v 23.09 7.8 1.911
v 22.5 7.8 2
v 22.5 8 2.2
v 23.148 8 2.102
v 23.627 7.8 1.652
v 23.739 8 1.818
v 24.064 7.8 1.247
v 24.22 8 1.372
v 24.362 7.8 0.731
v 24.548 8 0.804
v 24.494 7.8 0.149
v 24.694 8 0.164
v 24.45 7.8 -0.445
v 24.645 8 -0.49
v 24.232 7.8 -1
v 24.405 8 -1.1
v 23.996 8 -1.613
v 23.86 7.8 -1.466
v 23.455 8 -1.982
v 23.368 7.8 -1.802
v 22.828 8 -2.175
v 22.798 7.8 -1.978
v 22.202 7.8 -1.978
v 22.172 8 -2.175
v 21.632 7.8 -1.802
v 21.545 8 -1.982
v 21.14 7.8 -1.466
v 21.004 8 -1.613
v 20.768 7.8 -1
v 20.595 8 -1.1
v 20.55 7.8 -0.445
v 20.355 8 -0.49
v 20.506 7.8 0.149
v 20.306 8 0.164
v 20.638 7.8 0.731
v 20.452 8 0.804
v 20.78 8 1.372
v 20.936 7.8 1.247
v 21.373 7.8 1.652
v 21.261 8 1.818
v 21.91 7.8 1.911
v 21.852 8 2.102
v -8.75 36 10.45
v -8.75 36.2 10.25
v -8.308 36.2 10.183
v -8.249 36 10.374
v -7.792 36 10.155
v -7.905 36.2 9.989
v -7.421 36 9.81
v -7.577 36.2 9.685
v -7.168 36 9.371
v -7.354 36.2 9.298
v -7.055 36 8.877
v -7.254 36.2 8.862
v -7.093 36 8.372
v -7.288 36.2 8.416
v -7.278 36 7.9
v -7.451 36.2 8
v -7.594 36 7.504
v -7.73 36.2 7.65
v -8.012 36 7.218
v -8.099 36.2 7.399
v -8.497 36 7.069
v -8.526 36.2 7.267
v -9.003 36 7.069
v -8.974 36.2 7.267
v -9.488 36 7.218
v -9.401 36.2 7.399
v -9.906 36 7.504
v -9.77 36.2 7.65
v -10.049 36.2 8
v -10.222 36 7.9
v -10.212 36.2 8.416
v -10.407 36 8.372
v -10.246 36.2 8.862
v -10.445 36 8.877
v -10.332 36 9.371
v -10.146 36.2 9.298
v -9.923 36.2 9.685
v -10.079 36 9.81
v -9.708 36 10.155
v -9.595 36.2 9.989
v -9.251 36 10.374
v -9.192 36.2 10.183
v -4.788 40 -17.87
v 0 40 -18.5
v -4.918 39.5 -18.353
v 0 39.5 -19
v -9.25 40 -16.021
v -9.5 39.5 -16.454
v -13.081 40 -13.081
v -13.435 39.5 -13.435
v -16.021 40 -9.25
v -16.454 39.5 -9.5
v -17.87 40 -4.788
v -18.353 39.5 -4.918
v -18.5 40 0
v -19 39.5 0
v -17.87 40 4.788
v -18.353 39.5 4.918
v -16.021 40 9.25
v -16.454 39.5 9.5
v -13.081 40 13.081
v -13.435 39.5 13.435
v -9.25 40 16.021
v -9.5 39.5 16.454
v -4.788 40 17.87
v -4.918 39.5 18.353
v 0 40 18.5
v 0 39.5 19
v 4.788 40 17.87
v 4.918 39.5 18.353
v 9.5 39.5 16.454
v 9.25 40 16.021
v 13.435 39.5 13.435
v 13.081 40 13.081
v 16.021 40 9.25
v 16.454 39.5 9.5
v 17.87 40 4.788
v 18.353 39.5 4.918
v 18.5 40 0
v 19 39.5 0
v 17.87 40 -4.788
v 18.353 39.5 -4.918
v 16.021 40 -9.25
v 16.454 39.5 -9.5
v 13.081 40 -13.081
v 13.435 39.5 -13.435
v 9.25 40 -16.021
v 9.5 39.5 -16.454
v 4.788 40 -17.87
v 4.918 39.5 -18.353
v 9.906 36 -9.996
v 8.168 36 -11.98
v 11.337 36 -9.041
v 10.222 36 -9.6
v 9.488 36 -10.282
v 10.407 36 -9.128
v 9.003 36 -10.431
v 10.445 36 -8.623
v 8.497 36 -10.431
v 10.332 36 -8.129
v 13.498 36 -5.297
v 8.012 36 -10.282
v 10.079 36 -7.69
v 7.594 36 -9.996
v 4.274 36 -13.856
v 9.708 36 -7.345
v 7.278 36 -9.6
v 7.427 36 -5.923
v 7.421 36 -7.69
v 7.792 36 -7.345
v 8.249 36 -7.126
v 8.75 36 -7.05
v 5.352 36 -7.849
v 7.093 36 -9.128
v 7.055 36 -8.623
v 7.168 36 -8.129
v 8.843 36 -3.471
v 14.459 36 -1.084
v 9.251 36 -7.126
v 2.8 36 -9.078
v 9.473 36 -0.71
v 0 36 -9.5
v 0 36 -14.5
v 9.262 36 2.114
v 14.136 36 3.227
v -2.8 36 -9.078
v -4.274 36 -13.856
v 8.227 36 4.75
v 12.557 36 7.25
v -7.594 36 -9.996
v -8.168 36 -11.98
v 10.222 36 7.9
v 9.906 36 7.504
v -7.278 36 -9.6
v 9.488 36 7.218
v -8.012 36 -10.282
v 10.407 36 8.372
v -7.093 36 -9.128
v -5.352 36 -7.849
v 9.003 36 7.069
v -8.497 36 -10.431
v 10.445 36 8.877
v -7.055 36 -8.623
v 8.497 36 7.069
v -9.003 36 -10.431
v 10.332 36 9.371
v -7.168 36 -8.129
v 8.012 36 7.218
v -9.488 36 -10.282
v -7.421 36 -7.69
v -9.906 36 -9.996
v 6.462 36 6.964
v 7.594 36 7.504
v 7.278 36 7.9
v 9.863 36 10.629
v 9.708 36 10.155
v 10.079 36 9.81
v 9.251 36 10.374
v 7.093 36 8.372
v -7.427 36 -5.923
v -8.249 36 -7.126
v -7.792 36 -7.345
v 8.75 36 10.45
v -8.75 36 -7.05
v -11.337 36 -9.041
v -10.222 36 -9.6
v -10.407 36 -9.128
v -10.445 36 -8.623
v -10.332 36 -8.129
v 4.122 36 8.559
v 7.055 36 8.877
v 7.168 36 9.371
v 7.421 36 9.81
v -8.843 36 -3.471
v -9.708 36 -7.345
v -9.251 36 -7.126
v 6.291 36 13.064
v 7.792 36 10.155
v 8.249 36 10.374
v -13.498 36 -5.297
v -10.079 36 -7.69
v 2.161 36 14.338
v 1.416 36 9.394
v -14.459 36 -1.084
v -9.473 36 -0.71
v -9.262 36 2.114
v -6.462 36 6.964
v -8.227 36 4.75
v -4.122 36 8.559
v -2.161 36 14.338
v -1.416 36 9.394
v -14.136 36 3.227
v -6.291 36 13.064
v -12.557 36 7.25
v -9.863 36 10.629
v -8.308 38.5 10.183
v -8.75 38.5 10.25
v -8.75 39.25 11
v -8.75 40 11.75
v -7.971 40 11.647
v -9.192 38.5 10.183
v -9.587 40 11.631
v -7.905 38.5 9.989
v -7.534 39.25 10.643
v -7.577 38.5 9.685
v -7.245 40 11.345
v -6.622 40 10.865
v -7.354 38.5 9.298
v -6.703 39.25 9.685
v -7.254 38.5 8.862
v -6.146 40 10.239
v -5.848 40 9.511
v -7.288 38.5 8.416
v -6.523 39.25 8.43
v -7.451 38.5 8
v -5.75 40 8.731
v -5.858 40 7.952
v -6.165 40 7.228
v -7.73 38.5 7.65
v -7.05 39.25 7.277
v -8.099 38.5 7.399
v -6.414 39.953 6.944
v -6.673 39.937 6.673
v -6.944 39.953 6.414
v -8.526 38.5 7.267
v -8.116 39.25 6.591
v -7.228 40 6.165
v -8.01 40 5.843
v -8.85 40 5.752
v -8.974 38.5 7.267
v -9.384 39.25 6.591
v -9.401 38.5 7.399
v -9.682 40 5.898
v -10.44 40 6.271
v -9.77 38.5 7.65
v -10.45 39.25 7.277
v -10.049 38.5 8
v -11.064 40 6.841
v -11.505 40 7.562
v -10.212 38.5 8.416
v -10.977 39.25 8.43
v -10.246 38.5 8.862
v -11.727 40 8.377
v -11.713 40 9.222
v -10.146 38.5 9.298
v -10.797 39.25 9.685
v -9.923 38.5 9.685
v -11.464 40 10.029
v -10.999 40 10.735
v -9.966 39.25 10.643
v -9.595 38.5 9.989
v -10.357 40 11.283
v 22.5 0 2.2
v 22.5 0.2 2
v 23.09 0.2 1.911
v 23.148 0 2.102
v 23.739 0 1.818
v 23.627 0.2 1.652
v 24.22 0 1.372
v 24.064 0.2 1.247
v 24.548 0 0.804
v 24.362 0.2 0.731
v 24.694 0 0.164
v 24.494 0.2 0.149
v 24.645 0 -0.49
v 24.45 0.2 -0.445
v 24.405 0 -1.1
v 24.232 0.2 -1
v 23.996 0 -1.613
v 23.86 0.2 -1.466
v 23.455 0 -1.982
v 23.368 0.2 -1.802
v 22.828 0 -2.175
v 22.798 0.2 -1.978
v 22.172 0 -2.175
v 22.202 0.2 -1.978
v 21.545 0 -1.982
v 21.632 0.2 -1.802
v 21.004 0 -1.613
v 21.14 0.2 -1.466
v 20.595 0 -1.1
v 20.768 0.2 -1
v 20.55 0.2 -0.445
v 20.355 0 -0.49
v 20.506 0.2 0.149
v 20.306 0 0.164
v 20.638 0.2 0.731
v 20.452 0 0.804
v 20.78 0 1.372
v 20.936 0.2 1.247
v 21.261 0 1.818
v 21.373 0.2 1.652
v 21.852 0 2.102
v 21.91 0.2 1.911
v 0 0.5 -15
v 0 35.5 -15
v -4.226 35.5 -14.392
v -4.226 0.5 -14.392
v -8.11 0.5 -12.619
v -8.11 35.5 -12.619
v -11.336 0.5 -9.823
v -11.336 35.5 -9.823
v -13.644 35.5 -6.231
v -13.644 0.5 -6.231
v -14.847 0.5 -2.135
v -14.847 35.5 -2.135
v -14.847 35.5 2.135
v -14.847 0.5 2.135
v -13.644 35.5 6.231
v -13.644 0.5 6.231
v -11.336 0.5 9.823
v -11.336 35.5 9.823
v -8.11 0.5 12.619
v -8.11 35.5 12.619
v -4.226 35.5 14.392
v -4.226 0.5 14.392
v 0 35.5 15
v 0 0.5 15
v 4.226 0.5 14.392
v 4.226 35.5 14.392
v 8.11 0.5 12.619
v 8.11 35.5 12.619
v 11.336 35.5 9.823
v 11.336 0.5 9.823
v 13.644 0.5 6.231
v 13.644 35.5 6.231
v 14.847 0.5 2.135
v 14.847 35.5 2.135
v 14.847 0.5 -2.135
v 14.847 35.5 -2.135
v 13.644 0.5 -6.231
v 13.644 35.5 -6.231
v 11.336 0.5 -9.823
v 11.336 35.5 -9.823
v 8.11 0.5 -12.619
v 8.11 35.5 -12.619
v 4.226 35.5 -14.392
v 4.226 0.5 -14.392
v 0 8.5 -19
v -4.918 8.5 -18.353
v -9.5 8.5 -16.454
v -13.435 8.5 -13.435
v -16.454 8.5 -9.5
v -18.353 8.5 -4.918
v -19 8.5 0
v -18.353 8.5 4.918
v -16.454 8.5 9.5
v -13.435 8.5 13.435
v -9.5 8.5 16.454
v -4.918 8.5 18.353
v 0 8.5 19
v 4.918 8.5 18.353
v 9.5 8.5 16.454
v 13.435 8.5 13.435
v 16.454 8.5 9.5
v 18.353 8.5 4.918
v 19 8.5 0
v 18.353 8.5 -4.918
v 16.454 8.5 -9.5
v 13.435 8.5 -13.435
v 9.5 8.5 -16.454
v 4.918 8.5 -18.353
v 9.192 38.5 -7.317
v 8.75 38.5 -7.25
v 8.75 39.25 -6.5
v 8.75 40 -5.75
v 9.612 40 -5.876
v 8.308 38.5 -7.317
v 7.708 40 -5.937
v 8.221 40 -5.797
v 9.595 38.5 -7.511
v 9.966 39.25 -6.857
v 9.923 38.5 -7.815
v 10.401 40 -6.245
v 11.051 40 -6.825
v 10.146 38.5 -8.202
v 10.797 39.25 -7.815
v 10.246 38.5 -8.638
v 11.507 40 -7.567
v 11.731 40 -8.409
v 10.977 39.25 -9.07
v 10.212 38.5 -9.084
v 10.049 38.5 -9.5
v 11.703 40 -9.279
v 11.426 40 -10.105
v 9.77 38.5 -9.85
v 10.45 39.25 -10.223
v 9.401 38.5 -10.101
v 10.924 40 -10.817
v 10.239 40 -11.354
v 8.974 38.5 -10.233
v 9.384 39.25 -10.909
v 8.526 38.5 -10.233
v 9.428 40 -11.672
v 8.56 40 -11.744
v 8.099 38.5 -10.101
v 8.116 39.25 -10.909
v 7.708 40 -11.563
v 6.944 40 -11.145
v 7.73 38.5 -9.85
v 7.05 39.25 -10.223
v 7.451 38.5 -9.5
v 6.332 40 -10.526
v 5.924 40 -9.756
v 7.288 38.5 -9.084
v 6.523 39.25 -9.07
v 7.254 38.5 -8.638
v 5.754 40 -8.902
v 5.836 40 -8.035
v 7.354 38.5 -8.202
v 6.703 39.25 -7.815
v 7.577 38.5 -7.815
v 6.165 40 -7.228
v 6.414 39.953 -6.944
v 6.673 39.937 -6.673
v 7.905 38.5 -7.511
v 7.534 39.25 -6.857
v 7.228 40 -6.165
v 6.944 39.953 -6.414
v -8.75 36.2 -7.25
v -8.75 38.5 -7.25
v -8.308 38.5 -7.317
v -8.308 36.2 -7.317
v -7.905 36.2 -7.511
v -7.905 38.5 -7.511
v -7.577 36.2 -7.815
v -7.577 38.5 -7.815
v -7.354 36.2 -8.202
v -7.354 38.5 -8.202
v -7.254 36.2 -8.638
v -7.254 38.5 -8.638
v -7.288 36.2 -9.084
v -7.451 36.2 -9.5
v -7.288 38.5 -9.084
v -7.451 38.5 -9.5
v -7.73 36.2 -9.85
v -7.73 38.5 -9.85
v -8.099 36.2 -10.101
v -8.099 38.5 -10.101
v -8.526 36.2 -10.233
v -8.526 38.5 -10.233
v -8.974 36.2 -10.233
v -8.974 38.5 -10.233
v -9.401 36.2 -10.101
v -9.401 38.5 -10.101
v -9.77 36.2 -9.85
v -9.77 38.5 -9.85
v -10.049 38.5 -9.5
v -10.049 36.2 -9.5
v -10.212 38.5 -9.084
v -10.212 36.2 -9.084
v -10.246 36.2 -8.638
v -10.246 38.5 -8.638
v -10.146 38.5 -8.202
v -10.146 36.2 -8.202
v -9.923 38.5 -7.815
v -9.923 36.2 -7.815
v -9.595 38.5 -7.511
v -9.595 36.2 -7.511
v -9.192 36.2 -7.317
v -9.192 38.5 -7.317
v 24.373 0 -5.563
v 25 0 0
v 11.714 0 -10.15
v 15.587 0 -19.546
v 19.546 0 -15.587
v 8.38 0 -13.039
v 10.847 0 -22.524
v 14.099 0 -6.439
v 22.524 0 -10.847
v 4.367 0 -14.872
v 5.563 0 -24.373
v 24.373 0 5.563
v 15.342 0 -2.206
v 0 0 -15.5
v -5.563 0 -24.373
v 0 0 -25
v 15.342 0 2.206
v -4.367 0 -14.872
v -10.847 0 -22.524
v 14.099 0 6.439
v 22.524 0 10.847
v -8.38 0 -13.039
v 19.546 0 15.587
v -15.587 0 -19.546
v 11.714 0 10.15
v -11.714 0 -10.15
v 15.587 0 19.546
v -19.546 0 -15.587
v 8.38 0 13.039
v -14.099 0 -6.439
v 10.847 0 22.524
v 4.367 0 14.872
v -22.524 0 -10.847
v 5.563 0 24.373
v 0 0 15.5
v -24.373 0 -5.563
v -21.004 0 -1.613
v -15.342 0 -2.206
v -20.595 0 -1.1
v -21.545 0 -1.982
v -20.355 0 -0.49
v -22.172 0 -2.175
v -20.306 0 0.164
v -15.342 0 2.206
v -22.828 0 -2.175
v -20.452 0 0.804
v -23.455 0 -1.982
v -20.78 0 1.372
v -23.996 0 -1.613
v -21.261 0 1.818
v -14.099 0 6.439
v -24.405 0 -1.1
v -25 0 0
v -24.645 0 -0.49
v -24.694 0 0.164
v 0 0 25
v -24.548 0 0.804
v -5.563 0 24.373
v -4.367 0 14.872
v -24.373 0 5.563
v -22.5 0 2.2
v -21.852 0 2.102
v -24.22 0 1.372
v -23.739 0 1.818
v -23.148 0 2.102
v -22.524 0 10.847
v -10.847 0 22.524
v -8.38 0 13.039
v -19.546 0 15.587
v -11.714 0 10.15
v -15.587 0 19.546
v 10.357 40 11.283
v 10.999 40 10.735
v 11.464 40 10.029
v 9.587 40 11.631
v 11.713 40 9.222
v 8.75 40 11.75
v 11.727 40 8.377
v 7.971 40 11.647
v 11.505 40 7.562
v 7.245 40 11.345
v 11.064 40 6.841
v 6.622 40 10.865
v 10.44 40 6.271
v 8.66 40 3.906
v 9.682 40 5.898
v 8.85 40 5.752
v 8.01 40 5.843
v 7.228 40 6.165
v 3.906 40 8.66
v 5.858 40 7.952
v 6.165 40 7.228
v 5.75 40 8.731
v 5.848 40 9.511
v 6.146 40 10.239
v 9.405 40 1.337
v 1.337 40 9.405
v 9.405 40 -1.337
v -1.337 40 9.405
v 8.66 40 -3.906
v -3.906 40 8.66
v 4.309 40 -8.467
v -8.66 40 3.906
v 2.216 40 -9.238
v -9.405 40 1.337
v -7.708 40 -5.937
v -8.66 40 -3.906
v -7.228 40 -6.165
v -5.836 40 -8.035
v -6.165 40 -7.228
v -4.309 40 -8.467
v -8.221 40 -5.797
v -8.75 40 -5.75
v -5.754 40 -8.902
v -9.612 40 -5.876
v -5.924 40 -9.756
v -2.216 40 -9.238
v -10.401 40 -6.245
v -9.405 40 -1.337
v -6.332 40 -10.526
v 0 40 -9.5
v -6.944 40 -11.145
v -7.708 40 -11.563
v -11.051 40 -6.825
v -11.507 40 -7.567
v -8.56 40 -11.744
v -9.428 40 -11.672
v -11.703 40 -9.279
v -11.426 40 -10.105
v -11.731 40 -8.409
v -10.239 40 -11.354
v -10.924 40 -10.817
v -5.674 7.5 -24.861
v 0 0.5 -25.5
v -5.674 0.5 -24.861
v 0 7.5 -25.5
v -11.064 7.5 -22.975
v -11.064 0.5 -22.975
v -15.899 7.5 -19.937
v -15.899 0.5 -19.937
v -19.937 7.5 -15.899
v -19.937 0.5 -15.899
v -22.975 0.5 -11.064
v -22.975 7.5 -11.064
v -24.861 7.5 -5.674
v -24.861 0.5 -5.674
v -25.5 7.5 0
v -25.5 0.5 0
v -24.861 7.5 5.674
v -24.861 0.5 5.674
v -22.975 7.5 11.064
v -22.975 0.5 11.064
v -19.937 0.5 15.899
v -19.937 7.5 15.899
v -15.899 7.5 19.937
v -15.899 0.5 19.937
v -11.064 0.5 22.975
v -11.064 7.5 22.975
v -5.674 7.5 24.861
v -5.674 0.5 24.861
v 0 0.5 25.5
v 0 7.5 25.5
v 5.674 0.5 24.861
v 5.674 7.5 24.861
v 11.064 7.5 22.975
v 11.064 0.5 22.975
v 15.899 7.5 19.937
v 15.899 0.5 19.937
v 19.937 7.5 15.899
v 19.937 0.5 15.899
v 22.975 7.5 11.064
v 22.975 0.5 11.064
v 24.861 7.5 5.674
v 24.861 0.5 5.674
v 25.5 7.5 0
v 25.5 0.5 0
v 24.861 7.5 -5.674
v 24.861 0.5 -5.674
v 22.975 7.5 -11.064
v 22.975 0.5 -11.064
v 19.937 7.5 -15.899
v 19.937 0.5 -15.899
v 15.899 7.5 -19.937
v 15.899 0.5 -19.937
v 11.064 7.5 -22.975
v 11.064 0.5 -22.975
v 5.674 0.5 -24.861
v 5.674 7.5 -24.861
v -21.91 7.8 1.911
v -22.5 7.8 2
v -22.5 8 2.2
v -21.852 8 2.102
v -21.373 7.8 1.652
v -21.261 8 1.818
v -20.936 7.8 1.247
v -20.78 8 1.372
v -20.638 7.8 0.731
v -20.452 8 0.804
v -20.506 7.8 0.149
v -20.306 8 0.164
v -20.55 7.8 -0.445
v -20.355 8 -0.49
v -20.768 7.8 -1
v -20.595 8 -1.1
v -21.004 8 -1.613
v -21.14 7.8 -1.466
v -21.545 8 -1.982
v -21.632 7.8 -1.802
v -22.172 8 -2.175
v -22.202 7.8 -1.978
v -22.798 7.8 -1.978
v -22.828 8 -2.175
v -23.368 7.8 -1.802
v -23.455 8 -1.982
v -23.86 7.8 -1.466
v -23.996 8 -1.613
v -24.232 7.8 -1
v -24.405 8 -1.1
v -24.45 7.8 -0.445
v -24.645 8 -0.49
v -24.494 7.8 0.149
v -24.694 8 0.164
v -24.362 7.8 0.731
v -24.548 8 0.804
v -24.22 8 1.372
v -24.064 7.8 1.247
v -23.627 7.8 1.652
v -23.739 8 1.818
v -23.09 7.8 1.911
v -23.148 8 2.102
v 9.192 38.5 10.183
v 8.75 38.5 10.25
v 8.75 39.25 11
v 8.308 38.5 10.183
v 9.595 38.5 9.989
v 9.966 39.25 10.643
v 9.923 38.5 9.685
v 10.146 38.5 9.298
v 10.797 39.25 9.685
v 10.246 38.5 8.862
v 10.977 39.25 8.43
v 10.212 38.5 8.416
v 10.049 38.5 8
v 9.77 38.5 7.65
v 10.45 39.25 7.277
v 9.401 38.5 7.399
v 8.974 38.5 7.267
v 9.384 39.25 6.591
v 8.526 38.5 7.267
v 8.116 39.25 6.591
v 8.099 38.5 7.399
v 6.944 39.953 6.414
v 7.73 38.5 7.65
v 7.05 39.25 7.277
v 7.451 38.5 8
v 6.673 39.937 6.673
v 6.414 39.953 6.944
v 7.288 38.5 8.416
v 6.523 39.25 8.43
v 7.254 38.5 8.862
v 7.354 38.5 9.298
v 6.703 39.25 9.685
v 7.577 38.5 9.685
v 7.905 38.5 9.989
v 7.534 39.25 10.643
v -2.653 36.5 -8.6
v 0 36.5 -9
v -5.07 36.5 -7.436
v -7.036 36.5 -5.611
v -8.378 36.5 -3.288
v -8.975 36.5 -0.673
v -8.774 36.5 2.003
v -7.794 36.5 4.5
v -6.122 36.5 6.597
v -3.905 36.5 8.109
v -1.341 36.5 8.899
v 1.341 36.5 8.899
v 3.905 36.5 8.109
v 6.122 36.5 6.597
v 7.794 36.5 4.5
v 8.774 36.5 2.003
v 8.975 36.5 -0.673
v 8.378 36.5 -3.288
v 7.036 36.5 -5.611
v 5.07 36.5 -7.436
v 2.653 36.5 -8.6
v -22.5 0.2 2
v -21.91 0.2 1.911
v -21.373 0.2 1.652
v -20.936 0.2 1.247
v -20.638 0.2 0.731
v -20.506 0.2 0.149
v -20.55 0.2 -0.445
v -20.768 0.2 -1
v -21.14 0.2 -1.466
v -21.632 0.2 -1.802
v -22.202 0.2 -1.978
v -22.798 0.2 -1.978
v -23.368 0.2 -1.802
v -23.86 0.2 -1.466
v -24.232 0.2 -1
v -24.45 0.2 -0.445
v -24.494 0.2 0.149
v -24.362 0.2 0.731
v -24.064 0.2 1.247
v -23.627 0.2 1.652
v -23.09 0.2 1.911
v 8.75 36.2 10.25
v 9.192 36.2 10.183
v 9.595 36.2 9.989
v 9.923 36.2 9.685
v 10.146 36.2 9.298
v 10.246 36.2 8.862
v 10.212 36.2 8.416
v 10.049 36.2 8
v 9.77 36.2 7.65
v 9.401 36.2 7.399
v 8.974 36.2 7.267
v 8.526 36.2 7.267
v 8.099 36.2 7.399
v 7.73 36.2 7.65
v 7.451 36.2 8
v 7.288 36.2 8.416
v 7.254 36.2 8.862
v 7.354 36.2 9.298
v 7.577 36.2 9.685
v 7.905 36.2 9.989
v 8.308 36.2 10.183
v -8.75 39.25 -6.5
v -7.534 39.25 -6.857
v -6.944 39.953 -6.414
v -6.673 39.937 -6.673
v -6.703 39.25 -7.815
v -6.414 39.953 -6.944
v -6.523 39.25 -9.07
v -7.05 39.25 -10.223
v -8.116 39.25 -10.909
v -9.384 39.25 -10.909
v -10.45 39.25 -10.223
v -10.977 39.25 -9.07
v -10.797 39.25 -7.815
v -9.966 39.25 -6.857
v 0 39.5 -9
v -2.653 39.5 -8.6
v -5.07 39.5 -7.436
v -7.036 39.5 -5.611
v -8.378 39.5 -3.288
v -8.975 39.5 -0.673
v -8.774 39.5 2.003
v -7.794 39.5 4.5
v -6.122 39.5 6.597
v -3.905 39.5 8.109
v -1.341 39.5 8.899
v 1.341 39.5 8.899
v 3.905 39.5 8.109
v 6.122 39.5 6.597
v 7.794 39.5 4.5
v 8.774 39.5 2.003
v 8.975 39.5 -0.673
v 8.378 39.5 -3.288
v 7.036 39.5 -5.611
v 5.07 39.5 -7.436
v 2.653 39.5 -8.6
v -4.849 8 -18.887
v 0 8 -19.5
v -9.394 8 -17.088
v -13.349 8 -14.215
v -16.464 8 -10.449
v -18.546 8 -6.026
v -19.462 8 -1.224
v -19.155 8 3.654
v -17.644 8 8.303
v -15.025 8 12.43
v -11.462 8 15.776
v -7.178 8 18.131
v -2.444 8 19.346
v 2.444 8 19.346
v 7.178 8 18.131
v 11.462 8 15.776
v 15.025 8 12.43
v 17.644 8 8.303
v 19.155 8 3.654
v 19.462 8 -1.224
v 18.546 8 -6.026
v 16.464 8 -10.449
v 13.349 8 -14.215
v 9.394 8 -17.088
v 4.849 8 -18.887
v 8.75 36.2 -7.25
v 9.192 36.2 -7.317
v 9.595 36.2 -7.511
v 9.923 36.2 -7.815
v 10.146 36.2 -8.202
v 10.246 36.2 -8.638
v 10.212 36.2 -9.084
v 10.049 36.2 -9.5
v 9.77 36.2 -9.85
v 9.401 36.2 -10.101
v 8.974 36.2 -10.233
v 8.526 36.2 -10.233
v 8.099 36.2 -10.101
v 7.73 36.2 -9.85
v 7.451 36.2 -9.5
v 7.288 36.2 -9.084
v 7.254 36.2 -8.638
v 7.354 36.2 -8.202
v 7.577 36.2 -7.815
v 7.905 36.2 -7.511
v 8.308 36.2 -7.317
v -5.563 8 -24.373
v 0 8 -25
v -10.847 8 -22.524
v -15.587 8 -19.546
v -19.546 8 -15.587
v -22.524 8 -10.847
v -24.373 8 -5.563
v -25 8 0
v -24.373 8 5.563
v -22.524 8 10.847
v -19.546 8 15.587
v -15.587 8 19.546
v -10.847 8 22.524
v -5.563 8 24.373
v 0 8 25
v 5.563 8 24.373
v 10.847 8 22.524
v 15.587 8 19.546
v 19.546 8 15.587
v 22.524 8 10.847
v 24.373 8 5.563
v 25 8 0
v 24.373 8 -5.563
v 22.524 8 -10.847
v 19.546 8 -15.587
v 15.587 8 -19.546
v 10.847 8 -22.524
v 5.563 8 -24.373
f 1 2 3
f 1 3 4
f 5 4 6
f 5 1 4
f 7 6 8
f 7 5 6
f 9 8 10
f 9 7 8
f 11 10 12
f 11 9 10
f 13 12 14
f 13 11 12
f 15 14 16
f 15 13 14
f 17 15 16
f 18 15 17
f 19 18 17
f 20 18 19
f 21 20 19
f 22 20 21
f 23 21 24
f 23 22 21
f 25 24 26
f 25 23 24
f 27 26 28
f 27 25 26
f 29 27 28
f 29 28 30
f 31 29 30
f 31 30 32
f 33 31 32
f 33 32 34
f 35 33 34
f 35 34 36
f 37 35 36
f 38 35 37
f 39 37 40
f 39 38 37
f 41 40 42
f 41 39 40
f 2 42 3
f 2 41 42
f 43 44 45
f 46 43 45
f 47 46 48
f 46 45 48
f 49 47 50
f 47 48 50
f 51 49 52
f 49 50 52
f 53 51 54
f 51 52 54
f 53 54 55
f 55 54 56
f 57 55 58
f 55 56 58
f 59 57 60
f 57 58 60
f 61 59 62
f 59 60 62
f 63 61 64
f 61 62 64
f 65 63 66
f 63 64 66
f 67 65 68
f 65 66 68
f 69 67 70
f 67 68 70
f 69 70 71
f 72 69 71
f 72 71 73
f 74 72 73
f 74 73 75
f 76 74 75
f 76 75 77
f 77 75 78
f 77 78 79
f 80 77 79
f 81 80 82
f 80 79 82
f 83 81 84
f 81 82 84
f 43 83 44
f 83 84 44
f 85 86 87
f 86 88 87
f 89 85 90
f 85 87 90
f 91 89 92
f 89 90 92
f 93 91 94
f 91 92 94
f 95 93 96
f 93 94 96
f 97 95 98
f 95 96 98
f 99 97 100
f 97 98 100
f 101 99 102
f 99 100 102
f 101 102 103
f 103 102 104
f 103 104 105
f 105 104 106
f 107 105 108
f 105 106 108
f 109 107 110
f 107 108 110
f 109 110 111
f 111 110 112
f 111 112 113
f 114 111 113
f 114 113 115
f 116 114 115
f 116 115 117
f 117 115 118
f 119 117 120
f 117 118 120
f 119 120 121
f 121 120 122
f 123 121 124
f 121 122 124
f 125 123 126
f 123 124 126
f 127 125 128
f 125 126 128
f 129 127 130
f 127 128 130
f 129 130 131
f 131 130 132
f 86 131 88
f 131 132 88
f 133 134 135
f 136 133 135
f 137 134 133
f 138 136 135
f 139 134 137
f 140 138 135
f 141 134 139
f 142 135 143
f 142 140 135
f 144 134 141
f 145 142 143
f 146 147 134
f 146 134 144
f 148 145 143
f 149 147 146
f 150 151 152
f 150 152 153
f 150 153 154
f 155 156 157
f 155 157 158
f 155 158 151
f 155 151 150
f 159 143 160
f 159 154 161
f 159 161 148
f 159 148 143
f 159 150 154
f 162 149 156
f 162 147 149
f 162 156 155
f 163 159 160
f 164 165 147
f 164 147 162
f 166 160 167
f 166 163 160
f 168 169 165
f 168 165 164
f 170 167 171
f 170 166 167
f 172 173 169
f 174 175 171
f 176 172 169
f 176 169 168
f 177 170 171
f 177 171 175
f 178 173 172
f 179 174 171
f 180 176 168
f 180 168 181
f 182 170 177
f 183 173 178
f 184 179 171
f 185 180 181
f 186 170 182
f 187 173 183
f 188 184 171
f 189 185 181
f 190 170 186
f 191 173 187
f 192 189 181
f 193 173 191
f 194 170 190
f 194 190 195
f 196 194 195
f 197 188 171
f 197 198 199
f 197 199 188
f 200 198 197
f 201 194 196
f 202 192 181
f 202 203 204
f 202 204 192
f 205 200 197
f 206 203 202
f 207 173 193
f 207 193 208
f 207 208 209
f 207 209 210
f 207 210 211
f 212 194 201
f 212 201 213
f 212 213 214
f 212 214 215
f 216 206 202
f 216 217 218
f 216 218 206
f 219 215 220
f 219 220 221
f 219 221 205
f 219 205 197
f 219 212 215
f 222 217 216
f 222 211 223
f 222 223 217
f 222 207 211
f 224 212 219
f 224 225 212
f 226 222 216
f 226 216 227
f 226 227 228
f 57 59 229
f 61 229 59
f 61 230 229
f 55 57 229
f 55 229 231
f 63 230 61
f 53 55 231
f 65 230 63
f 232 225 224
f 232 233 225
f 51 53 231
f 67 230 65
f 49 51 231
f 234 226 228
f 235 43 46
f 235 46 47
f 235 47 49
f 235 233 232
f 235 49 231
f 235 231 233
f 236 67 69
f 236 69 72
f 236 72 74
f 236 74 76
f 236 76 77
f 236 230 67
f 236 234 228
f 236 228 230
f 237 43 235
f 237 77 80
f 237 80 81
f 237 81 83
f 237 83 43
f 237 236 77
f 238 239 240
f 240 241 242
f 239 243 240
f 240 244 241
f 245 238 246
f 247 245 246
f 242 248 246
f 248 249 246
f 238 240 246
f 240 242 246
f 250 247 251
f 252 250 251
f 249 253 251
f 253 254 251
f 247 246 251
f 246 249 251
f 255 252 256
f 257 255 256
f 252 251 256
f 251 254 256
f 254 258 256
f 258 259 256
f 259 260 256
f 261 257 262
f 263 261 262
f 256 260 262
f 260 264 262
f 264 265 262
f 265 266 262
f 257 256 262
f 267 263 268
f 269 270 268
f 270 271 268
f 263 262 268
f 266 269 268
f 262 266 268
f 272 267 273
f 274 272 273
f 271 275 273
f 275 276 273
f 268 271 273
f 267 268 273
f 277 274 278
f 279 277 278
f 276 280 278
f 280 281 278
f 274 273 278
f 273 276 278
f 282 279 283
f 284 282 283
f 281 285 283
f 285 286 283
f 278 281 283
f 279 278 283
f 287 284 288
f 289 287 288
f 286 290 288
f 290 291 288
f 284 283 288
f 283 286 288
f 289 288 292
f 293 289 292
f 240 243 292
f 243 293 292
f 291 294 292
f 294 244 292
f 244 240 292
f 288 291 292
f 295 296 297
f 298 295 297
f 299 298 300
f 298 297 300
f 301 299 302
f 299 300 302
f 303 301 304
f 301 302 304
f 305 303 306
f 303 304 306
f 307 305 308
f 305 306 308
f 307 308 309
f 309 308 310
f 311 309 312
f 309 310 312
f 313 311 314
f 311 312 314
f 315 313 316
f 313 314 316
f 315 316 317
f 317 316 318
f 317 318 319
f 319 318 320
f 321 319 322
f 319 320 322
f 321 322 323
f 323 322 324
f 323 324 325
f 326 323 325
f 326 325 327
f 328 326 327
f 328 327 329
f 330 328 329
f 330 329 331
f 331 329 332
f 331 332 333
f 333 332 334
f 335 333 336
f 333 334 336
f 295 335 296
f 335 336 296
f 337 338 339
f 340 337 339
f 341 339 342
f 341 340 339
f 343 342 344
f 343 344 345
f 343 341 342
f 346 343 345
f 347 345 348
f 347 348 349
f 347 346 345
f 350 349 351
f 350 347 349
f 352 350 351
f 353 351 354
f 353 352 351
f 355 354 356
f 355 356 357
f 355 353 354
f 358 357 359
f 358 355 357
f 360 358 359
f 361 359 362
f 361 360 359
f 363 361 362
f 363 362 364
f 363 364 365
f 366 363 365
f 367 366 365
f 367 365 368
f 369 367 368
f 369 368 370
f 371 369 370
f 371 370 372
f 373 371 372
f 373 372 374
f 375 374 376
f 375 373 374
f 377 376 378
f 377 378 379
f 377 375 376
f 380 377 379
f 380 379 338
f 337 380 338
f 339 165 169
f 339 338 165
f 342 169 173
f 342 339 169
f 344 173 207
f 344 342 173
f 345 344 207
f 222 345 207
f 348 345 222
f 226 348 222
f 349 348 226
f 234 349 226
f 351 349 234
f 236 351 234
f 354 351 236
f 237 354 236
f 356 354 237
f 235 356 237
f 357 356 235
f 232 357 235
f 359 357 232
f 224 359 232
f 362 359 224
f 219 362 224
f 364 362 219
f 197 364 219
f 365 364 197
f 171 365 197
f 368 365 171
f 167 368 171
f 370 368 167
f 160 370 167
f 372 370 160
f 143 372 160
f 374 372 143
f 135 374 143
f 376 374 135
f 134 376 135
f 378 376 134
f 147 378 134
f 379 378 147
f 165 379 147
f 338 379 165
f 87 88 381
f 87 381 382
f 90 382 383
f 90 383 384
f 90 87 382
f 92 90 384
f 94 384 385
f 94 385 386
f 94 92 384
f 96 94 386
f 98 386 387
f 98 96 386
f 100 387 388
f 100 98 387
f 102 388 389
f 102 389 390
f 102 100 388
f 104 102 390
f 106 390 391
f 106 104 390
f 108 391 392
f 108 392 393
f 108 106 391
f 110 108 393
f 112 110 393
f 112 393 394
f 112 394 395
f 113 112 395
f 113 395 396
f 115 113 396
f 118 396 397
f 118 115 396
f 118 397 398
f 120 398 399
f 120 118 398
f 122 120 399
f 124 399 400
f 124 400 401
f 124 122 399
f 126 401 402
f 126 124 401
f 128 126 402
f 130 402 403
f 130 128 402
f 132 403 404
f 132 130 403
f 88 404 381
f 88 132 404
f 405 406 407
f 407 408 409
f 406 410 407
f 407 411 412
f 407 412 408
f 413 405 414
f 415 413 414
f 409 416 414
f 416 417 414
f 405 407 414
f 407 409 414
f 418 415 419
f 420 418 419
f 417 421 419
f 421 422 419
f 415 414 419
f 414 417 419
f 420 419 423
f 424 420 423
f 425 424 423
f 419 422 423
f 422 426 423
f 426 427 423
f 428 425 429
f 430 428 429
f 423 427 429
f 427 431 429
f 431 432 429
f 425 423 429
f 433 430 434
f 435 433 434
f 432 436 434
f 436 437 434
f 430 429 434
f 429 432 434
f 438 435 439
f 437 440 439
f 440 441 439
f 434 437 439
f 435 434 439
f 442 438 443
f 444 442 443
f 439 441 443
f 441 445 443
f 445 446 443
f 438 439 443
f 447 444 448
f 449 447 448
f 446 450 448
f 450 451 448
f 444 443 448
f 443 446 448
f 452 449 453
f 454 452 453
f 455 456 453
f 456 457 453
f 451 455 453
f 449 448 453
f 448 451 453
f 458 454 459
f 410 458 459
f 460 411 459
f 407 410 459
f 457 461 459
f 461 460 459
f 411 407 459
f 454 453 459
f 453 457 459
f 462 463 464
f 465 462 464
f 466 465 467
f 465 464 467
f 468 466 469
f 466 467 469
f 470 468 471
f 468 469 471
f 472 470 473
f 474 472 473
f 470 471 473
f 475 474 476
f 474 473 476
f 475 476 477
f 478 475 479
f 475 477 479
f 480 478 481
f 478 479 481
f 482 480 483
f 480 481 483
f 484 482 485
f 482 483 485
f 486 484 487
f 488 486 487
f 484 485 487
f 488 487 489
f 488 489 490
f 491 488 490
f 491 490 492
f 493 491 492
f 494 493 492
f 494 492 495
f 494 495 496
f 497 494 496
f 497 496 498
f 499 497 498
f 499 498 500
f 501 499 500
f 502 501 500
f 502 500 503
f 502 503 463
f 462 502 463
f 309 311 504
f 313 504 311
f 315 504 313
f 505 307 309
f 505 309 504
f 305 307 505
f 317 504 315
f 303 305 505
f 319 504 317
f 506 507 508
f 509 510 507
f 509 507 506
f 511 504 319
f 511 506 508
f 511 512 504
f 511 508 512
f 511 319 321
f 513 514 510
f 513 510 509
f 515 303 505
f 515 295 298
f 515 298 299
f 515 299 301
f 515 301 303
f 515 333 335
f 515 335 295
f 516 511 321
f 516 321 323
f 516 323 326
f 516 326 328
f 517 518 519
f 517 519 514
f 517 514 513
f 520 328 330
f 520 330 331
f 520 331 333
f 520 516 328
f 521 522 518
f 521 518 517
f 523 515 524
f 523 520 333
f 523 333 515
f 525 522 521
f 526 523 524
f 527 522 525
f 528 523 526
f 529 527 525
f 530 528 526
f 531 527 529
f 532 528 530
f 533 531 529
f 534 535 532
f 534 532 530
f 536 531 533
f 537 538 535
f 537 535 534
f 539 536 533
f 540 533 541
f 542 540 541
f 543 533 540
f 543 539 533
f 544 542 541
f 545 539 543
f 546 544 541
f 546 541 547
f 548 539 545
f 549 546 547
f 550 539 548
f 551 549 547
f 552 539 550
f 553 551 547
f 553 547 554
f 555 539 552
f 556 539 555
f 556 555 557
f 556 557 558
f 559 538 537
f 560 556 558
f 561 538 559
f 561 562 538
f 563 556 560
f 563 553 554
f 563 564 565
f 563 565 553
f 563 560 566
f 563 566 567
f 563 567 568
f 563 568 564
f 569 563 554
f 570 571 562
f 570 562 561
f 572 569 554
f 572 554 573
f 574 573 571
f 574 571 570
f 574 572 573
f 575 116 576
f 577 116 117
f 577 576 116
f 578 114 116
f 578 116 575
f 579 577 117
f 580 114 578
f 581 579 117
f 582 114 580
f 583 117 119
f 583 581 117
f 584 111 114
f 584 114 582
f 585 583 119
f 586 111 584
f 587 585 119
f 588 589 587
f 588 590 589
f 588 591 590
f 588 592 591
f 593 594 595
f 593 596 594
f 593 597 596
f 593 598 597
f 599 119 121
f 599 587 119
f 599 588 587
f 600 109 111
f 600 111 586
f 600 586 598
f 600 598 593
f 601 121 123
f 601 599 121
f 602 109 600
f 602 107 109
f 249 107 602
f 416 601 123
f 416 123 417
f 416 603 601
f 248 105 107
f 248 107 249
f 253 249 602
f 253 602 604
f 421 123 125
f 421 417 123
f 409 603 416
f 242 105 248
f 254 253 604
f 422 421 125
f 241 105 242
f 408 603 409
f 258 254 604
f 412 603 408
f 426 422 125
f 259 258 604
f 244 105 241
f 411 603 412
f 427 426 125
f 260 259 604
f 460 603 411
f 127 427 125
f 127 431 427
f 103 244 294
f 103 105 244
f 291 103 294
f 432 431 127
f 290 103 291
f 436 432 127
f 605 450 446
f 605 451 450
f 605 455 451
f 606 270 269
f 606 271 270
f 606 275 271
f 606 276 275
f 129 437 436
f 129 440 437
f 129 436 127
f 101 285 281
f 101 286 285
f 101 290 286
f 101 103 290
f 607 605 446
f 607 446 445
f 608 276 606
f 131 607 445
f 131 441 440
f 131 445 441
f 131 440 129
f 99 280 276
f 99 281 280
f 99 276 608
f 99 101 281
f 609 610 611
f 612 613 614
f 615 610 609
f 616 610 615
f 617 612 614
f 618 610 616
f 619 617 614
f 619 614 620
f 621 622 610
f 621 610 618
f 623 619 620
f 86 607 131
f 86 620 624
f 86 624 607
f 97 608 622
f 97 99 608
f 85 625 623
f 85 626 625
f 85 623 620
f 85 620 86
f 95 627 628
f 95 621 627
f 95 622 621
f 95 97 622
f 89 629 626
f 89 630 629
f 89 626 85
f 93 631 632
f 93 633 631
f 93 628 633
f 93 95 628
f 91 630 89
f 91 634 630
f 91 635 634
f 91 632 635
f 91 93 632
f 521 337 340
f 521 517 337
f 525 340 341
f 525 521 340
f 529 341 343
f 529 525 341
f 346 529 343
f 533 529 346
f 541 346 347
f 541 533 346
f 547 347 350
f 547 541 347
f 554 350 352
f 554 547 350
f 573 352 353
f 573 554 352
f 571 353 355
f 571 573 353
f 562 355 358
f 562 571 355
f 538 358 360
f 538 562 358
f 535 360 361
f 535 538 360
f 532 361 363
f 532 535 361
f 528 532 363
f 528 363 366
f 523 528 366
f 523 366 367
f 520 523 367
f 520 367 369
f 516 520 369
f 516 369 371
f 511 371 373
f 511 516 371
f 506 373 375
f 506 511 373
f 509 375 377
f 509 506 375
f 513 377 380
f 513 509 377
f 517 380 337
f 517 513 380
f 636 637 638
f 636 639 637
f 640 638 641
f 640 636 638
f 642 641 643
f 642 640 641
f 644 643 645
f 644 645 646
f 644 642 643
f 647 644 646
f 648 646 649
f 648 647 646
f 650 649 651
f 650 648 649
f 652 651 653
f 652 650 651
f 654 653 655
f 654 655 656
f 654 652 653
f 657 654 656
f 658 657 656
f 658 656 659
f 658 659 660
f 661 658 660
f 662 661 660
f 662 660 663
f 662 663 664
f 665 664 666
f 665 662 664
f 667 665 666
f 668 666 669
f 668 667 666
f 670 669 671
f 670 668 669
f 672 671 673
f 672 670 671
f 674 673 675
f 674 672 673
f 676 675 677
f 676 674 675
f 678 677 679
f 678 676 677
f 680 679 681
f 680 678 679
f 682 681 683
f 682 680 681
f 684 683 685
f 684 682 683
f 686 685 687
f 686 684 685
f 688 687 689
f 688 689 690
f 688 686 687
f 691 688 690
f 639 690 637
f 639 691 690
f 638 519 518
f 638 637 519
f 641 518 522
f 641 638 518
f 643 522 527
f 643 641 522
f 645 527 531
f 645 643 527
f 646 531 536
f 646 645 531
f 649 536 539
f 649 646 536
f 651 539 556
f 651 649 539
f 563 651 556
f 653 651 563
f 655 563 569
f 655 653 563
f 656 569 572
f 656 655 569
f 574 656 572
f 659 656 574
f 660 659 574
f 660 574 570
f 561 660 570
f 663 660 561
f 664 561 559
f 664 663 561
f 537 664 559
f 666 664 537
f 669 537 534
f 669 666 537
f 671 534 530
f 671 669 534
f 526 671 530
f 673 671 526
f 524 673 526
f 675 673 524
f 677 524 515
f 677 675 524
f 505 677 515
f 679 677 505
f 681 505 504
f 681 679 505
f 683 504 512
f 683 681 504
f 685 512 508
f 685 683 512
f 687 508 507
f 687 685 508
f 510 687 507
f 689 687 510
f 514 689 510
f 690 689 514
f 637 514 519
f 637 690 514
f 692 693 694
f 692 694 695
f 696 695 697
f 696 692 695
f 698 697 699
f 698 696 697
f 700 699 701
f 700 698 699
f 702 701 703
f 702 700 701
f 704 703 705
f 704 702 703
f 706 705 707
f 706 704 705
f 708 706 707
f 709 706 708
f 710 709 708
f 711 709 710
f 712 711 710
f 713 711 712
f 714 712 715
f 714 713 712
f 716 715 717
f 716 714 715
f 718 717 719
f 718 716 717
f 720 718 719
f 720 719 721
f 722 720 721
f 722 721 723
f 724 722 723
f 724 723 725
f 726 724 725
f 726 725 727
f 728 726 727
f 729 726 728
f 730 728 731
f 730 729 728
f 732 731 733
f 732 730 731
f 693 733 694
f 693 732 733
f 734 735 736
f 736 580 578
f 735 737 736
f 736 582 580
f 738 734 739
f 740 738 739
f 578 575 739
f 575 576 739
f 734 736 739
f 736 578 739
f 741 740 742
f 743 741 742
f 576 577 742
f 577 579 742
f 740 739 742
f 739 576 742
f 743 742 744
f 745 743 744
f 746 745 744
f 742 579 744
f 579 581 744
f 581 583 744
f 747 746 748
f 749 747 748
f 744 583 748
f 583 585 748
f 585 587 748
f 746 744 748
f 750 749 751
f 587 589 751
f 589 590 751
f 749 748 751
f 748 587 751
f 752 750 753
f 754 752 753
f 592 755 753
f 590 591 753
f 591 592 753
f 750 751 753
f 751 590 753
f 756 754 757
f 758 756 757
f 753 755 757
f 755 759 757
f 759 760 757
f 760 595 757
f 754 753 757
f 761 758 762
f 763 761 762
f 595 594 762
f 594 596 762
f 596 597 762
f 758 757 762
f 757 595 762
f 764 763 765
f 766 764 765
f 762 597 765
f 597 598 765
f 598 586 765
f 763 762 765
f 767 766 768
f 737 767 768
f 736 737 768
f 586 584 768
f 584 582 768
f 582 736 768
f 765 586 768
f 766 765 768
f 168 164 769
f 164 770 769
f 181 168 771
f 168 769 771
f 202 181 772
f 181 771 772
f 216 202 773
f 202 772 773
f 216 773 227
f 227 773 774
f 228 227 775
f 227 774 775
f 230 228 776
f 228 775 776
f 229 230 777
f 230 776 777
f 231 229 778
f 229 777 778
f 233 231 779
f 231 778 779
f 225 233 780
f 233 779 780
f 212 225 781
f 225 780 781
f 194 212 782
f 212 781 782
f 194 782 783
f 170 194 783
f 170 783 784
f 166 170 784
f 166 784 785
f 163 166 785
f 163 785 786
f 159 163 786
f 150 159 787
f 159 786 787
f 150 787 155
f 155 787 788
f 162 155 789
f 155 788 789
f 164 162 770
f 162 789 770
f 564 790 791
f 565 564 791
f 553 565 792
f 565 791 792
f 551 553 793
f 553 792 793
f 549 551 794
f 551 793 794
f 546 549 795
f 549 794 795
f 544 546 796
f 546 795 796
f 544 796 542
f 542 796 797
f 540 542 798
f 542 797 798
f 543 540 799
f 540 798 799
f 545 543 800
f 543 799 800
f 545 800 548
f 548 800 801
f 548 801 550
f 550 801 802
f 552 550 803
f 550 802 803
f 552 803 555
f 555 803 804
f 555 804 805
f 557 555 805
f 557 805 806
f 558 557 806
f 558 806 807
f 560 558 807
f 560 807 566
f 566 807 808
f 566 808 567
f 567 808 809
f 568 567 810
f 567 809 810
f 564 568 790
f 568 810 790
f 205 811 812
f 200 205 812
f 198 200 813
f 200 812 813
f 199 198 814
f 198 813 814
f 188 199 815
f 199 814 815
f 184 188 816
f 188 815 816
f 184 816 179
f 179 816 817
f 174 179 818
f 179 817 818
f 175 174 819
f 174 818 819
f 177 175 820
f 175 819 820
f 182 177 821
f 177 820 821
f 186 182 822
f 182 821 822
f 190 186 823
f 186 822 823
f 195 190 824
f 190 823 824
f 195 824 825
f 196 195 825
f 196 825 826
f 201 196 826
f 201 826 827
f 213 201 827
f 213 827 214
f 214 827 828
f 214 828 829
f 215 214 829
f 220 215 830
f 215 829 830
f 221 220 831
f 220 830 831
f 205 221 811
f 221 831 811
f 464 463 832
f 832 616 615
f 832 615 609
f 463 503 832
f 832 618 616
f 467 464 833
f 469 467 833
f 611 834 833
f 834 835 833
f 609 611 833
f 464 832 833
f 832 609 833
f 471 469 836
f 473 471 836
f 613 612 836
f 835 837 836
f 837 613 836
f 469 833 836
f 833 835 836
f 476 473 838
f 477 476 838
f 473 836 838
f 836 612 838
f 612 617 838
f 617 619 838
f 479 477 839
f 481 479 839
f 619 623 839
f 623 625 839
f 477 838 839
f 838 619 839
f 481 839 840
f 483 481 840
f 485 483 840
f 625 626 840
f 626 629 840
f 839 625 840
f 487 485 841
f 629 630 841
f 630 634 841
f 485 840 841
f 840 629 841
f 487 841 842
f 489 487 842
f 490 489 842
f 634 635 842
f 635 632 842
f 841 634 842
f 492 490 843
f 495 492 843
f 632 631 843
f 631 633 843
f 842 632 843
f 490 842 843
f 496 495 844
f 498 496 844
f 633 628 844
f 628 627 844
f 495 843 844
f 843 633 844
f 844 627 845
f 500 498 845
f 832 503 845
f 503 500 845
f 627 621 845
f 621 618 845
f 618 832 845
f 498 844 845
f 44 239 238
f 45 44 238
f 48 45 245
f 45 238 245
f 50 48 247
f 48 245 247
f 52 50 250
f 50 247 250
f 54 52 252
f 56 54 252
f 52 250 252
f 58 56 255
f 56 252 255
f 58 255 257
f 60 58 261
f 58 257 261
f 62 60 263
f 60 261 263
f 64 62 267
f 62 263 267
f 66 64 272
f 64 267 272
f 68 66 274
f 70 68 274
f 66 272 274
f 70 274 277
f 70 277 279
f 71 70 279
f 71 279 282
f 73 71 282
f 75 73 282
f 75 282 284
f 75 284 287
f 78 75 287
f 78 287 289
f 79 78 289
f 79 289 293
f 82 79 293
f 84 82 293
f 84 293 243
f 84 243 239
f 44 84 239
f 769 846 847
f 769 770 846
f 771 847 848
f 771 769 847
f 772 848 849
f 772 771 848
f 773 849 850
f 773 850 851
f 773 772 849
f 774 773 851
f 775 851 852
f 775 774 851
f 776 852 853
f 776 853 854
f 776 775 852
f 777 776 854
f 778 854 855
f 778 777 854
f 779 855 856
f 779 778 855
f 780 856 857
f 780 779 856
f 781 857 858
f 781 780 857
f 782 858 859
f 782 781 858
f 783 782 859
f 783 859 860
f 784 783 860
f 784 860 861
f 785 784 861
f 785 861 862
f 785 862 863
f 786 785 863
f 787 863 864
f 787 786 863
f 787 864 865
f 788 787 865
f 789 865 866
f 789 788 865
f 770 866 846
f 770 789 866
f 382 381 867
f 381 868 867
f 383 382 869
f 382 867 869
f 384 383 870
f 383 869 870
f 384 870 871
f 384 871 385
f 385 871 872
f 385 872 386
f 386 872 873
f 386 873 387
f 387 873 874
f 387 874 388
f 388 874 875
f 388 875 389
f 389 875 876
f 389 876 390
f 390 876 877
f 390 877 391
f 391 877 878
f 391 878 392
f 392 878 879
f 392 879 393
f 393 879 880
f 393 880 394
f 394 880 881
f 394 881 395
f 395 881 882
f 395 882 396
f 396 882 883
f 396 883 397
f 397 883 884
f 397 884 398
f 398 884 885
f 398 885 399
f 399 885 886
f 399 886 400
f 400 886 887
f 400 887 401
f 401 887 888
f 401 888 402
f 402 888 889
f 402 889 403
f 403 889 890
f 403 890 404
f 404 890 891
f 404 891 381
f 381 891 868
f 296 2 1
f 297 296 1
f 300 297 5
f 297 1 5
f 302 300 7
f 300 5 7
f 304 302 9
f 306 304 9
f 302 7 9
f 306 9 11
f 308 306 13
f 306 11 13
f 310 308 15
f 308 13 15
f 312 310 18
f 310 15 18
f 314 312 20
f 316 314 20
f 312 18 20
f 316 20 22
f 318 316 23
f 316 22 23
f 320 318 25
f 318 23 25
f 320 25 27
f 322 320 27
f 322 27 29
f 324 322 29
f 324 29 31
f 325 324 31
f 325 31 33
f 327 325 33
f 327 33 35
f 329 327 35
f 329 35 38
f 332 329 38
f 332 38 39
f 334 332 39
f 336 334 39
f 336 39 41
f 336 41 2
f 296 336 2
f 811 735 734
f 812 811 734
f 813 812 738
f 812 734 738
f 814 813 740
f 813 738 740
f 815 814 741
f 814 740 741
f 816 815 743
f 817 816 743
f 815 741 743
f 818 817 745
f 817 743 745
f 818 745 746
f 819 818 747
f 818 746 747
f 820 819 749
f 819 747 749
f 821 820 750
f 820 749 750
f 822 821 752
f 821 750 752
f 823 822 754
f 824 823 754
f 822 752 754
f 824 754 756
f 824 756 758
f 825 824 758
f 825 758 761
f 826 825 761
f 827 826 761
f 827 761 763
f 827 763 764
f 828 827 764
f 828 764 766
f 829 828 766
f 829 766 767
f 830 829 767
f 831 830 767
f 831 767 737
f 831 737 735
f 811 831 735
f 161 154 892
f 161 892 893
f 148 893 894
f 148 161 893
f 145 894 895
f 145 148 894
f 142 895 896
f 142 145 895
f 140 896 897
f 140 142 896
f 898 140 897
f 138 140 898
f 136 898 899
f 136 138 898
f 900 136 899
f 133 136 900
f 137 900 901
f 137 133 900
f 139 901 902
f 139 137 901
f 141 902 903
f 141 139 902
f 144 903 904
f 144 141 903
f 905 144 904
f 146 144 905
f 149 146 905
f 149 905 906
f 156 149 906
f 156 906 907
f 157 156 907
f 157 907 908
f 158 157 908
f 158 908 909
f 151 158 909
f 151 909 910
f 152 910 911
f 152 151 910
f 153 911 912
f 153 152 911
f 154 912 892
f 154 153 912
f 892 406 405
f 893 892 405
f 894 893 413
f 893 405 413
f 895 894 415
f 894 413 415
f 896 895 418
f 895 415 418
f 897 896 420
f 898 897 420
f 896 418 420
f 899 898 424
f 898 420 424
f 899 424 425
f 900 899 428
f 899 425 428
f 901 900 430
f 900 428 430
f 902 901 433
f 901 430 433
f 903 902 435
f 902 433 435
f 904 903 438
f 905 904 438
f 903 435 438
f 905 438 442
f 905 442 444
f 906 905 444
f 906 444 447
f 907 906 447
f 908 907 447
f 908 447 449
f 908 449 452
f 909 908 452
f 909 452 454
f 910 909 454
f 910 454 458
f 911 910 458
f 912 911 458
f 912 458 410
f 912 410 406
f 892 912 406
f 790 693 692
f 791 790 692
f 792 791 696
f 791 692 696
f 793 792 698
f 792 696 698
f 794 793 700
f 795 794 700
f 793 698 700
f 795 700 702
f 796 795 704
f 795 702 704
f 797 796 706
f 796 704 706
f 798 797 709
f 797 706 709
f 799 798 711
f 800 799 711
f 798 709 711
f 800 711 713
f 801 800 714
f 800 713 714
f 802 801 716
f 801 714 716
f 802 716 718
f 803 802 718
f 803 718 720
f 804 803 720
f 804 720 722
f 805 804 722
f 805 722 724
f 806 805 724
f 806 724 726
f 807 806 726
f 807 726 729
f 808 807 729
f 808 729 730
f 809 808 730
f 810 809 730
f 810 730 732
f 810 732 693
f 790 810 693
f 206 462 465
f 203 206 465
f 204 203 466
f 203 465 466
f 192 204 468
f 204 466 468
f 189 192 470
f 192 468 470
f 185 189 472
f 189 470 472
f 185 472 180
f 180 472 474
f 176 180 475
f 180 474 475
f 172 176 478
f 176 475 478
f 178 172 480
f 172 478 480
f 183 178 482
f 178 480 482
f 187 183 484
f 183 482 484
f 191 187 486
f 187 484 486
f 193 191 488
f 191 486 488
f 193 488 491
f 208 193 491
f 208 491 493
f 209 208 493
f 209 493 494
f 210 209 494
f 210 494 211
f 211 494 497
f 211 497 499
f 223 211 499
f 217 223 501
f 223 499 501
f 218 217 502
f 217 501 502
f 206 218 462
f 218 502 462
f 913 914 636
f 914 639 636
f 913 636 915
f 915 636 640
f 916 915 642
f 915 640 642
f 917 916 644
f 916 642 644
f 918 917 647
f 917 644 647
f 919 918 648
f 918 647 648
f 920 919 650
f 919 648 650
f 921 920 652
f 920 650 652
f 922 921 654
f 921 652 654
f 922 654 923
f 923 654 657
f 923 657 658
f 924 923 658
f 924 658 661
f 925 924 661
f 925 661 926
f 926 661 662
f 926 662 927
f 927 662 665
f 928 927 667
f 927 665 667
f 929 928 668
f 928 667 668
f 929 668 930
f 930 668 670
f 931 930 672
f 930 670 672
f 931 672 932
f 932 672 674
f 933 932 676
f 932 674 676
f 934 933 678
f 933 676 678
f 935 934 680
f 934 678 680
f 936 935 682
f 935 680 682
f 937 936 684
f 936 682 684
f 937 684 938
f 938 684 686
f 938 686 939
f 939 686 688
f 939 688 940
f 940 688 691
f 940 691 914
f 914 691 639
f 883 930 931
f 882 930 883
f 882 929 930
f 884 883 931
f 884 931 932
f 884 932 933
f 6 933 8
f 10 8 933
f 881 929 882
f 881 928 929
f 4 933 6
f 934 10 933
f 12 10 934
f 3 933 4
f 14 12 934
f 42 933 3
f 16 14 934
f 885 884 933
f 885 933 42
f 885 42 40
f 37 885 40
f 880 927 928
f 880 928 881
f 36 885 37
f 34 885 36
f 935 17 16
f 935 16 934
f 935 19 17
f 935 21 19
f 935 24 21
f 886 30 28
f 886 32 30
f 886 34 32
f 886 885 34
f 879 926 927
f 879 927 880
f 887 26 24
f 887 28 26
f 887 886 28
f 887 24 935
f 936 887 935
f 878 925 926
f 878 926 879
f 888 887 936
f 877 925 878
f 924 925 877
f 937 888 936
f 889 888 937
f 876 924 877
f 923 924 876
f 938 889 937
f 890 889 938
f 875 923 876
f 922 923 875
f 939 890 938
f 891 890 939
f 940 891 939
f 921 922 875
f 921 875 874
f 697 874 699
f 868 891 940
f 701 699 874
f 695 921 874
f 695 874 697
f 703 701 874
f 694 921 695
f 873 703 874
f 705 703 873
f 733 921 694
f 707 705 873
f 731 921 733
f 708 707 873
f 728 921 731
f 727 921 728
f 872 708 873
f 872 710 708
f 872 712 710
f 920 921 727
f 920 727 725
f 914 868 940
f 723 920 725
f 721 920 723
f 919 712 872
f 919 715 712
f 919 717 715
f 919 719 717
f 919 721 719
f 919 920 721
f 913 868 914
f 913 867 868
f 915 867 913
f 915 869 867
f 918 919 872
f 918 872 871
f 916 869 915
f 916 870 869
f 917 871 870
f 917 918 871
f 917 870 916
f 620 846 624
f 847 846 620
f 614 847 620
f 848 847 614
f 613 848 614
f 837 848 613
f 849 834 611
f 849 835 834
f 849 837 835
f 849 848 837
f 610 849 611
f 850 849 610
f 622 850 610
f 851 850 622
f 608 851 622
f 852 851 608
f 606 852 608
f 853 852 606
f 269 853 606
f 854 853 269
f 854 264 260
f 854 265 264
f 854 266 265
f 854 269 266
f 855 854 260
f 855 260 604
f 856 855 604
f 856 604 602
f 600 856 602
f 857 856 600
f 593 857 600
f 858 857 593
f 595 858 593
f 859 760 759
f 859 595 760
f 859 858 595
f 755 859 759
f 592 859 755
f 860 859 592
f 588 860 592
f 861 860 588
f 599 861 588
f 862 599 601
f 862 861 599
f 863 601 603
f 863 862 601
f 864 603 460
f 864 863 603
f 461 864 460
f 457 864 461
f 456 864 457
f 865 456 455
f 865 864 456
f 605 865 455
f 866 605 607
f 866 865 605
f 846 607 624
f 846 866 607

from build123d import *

# Parameters (mm, degrees)
ESQUISSE2_R             = 1.5
ENL_V_MAT_EXTRU_1_DEPTH = 10
CHANFREIN1_SIZE         = 1.5
ESQUISSE3_R             = 2
ENL_V_MAT_EXTRU_2_DEPTH = 10
CHANFREIN2_SIZE         = 0.2
CHANFREIN3_SIZE         = 0.5


with BuildPart() as part:
    # Esquisse1 → Révolution1 (revolve)
    with BuildSketch(Plane.XY, mode=Mode.PRIVATE) as r_volution1_sk:
        Polygon((-15, 0), (-25.5, 0), (-25.5, 8), (-19, 8), (-19, 40), (-9, 40), (-9, 36), (-15, 36), align=None)
    revolve(r_volution1_sk.sketch.rotate(Axis((0, 0, 0), (0, 1, 0)), 270), axis=Axis((0, 0, 0), (0, 1, 0)))

    # Esquisse2 → Enlèv. mat.-Extru.1 (cut)
    with BuildSketch(Plane(origin=(0, 40, 0), x_dir=(1, 0, 0), z_dir=(0, 1, 0))):
        with Locations(Location((-8.75, 8.75, 0), (0, 0, 270))):
            Circle(ESQUISSE2_R)
        with Locations(Location((8.75, 8.75, 0), (0, 0, 270))):
            Circle(ESQUISSE2_R)
        with Locations(Location((8.75, -8.75, 0), (0, 0, 270))):
            Circle(ESQUISSE2_R)
        with Locations(Location((-8.75, -8.75, 0), (0, 0, 270))):
            Circle(ESQUISSE2_R)
    extrude(amount=-ENL_V_MAT_EXTRU_1_DEPTH, mode=Mode.SUBTRACT)

    # Chanfrein1
    chanfrein1_edges = [part.edges().sort_by_distance(p)[0] for p in [
        (-8.75, 40, -10.25),
        (8.75, 40, -10.25),
        (8.75, 40, 7.25),
        (-8.75, 40, 7.25),
    ]]
    chamfer(chanfrein1_edges, length=CHANFREIN1_SIZE)

    # Esquisse3 → Enlèv. mat.-Extru.2 (cut)
    with BuildSketch(Plane(origin=(0, 8, 0), x_dir=(1, 0, 0), z_dir=(0, 1, 0))):
        with Locations(Location((-22.5, 0, 0), (0, 0, 270))):
            Circle(ESQUISSE3_R)
        with Locations(Location((22.5, 0, 0), (0, 0, 270))):
            Circle(ESQUISSE3_R)
    extrude(amount=-ENL_V_MAT_EXTRU_2_DEPTH, mode=Mode.SUBTRACT)

    # Chanfrein2
    chanfrein2_edges = [part.edges().sort_by_distance(p)[0] for p in [
        (-8.75, 36, -10.25),
        (8.75, 36, -10.25),
        (8.75, 36, 7.25),
        (-8.75, 36, 7.25),
        (-22.5, 0, -2),
        (-22.5, 8, -2),
        (22.5, 0, -2),
        (22.5, 8, -2),
    ]]
    chamfer(chanfrein2_edges, length=CHANFREIN2_SIZE)

    # Chanfrein3
    # the kernel refuses this chamfer: 0.5 mm, written as the material it adds along each edge
    with BuildSketch(Plane(origin=(0, 36, 0), x_dir=(0, 0, -1), z_dir=(1, 0, 0))) as chanfrein3_piece_1:
        Polygon((15 - CHANFREIN3_SIZE, 0), (15, -CHANFREIN3_SIZE), (15, 0), align=None)
    revolve(axis=Axis((0, 36, 0), (0, 1, 0)))
    with BuildSketch(Plane(origin=(0, 8, 0), x_dir=(0, 0, -1), z_dir=(1, 0, 0))) as chanfrein3_piece_2:
        Polygon((19, CHANFREIN3_SIZE), (19 + CHANFREIN3_SIZE, 0), (19, 0), align=None)
    revolve(axis=Axis((0, 8, 0), (0, 1, 0)))
    # the kernel refuses this chamfer: 0.5 mm, written as the material it takes off along each edge
    with BuildSketch(Plane(origin=(0, 36, 0), x_dir=(0, 0, -1), z_dir=(1, 0, 0))) as chanfrein3_2_piece_1:
        Polygon((9 + CHANFREIN3_SIZE, 0), (9, CHANFREIN3_SIZE), (9, 0), align=None)
    revolve(axis=Axis((0, 36, 0), (0, 1, 0)), mode=Mode.SUBTRACT)
    with BuildSketch(Plane(origin=(0, 40, 0), x_dir=(0, 0, -1), z_dir=(1, 0, 0))) as chanfrein3_2_piece_2:
        Polygon((9 + CHANFREIN3_SIZE, 0), (9, -CHANFREIN3_SIZE), (9, 0), align=None)
    revolve(axis=Axis((0, 40, 0), (0, 1, 0)), mode=Mode.SUBTRACT)
    with BuildSketch(Plane(origin=(0, 40, 0), x_dir=(0, 0, -1), z_dir=(1, 0, 0))) as chanfrein3_2_piece_3:
        Polygon((19 - CHANFREIN3_SIZE, 0), (19, -CHANFREIN3_SIZE), (19, 0), align=None)
    revolve(axis=Axis((0, 40, 0), (0, 1, 0)), mode=Mode.SUBTRACT)
    with BuildSketch(Plane(origin=(0, 8, 0), x_dir=(0, 0, -1), z_dir=(1, 0, 0))) as chanfrein3_2_piece_4:
        Polygon((25.5 - CHANFREIN3_SIZE, 0), (25.5, -CHANFREIN3_SIZE), (25.5, 0), align=None)
    revolve(axis=Axis((0, 8, 0), (0, 1, 0)), mode=Mode.SUBTRACT)
    with BuildSketch(Plane(origin=(0, 0, 0), x_dir=(0, 0, -1), z_dir=(1, 0, 0))) as chanfrein3_2_piece_5:
        Polygon((25.5 - CHANFREIN3_SIZE, 0), (25.5, CHANFREIN3_SIZE), (25.5, 0), align=None)
    revolve(axis=Axis((0, 0, 0), (0, 1, 0)), mode=Mode.SUBTRACT)
    with BuildSketch(Plane(origin=(0, 0, 0), x_dir=(0, 0, -1), z_dir=(1, 0, 0))) as chanfrein3_2_piece_6:
        Polygon((15, CHANFREIN3_SIZE), (15 + CHANFREIN3_SIZE, 0), (15, 0), align=None)
    revolve(axis=Axis((0, 0, 0), (0, 1, 0)), mode=Mode.SUBTRACT)


solid = part.part
